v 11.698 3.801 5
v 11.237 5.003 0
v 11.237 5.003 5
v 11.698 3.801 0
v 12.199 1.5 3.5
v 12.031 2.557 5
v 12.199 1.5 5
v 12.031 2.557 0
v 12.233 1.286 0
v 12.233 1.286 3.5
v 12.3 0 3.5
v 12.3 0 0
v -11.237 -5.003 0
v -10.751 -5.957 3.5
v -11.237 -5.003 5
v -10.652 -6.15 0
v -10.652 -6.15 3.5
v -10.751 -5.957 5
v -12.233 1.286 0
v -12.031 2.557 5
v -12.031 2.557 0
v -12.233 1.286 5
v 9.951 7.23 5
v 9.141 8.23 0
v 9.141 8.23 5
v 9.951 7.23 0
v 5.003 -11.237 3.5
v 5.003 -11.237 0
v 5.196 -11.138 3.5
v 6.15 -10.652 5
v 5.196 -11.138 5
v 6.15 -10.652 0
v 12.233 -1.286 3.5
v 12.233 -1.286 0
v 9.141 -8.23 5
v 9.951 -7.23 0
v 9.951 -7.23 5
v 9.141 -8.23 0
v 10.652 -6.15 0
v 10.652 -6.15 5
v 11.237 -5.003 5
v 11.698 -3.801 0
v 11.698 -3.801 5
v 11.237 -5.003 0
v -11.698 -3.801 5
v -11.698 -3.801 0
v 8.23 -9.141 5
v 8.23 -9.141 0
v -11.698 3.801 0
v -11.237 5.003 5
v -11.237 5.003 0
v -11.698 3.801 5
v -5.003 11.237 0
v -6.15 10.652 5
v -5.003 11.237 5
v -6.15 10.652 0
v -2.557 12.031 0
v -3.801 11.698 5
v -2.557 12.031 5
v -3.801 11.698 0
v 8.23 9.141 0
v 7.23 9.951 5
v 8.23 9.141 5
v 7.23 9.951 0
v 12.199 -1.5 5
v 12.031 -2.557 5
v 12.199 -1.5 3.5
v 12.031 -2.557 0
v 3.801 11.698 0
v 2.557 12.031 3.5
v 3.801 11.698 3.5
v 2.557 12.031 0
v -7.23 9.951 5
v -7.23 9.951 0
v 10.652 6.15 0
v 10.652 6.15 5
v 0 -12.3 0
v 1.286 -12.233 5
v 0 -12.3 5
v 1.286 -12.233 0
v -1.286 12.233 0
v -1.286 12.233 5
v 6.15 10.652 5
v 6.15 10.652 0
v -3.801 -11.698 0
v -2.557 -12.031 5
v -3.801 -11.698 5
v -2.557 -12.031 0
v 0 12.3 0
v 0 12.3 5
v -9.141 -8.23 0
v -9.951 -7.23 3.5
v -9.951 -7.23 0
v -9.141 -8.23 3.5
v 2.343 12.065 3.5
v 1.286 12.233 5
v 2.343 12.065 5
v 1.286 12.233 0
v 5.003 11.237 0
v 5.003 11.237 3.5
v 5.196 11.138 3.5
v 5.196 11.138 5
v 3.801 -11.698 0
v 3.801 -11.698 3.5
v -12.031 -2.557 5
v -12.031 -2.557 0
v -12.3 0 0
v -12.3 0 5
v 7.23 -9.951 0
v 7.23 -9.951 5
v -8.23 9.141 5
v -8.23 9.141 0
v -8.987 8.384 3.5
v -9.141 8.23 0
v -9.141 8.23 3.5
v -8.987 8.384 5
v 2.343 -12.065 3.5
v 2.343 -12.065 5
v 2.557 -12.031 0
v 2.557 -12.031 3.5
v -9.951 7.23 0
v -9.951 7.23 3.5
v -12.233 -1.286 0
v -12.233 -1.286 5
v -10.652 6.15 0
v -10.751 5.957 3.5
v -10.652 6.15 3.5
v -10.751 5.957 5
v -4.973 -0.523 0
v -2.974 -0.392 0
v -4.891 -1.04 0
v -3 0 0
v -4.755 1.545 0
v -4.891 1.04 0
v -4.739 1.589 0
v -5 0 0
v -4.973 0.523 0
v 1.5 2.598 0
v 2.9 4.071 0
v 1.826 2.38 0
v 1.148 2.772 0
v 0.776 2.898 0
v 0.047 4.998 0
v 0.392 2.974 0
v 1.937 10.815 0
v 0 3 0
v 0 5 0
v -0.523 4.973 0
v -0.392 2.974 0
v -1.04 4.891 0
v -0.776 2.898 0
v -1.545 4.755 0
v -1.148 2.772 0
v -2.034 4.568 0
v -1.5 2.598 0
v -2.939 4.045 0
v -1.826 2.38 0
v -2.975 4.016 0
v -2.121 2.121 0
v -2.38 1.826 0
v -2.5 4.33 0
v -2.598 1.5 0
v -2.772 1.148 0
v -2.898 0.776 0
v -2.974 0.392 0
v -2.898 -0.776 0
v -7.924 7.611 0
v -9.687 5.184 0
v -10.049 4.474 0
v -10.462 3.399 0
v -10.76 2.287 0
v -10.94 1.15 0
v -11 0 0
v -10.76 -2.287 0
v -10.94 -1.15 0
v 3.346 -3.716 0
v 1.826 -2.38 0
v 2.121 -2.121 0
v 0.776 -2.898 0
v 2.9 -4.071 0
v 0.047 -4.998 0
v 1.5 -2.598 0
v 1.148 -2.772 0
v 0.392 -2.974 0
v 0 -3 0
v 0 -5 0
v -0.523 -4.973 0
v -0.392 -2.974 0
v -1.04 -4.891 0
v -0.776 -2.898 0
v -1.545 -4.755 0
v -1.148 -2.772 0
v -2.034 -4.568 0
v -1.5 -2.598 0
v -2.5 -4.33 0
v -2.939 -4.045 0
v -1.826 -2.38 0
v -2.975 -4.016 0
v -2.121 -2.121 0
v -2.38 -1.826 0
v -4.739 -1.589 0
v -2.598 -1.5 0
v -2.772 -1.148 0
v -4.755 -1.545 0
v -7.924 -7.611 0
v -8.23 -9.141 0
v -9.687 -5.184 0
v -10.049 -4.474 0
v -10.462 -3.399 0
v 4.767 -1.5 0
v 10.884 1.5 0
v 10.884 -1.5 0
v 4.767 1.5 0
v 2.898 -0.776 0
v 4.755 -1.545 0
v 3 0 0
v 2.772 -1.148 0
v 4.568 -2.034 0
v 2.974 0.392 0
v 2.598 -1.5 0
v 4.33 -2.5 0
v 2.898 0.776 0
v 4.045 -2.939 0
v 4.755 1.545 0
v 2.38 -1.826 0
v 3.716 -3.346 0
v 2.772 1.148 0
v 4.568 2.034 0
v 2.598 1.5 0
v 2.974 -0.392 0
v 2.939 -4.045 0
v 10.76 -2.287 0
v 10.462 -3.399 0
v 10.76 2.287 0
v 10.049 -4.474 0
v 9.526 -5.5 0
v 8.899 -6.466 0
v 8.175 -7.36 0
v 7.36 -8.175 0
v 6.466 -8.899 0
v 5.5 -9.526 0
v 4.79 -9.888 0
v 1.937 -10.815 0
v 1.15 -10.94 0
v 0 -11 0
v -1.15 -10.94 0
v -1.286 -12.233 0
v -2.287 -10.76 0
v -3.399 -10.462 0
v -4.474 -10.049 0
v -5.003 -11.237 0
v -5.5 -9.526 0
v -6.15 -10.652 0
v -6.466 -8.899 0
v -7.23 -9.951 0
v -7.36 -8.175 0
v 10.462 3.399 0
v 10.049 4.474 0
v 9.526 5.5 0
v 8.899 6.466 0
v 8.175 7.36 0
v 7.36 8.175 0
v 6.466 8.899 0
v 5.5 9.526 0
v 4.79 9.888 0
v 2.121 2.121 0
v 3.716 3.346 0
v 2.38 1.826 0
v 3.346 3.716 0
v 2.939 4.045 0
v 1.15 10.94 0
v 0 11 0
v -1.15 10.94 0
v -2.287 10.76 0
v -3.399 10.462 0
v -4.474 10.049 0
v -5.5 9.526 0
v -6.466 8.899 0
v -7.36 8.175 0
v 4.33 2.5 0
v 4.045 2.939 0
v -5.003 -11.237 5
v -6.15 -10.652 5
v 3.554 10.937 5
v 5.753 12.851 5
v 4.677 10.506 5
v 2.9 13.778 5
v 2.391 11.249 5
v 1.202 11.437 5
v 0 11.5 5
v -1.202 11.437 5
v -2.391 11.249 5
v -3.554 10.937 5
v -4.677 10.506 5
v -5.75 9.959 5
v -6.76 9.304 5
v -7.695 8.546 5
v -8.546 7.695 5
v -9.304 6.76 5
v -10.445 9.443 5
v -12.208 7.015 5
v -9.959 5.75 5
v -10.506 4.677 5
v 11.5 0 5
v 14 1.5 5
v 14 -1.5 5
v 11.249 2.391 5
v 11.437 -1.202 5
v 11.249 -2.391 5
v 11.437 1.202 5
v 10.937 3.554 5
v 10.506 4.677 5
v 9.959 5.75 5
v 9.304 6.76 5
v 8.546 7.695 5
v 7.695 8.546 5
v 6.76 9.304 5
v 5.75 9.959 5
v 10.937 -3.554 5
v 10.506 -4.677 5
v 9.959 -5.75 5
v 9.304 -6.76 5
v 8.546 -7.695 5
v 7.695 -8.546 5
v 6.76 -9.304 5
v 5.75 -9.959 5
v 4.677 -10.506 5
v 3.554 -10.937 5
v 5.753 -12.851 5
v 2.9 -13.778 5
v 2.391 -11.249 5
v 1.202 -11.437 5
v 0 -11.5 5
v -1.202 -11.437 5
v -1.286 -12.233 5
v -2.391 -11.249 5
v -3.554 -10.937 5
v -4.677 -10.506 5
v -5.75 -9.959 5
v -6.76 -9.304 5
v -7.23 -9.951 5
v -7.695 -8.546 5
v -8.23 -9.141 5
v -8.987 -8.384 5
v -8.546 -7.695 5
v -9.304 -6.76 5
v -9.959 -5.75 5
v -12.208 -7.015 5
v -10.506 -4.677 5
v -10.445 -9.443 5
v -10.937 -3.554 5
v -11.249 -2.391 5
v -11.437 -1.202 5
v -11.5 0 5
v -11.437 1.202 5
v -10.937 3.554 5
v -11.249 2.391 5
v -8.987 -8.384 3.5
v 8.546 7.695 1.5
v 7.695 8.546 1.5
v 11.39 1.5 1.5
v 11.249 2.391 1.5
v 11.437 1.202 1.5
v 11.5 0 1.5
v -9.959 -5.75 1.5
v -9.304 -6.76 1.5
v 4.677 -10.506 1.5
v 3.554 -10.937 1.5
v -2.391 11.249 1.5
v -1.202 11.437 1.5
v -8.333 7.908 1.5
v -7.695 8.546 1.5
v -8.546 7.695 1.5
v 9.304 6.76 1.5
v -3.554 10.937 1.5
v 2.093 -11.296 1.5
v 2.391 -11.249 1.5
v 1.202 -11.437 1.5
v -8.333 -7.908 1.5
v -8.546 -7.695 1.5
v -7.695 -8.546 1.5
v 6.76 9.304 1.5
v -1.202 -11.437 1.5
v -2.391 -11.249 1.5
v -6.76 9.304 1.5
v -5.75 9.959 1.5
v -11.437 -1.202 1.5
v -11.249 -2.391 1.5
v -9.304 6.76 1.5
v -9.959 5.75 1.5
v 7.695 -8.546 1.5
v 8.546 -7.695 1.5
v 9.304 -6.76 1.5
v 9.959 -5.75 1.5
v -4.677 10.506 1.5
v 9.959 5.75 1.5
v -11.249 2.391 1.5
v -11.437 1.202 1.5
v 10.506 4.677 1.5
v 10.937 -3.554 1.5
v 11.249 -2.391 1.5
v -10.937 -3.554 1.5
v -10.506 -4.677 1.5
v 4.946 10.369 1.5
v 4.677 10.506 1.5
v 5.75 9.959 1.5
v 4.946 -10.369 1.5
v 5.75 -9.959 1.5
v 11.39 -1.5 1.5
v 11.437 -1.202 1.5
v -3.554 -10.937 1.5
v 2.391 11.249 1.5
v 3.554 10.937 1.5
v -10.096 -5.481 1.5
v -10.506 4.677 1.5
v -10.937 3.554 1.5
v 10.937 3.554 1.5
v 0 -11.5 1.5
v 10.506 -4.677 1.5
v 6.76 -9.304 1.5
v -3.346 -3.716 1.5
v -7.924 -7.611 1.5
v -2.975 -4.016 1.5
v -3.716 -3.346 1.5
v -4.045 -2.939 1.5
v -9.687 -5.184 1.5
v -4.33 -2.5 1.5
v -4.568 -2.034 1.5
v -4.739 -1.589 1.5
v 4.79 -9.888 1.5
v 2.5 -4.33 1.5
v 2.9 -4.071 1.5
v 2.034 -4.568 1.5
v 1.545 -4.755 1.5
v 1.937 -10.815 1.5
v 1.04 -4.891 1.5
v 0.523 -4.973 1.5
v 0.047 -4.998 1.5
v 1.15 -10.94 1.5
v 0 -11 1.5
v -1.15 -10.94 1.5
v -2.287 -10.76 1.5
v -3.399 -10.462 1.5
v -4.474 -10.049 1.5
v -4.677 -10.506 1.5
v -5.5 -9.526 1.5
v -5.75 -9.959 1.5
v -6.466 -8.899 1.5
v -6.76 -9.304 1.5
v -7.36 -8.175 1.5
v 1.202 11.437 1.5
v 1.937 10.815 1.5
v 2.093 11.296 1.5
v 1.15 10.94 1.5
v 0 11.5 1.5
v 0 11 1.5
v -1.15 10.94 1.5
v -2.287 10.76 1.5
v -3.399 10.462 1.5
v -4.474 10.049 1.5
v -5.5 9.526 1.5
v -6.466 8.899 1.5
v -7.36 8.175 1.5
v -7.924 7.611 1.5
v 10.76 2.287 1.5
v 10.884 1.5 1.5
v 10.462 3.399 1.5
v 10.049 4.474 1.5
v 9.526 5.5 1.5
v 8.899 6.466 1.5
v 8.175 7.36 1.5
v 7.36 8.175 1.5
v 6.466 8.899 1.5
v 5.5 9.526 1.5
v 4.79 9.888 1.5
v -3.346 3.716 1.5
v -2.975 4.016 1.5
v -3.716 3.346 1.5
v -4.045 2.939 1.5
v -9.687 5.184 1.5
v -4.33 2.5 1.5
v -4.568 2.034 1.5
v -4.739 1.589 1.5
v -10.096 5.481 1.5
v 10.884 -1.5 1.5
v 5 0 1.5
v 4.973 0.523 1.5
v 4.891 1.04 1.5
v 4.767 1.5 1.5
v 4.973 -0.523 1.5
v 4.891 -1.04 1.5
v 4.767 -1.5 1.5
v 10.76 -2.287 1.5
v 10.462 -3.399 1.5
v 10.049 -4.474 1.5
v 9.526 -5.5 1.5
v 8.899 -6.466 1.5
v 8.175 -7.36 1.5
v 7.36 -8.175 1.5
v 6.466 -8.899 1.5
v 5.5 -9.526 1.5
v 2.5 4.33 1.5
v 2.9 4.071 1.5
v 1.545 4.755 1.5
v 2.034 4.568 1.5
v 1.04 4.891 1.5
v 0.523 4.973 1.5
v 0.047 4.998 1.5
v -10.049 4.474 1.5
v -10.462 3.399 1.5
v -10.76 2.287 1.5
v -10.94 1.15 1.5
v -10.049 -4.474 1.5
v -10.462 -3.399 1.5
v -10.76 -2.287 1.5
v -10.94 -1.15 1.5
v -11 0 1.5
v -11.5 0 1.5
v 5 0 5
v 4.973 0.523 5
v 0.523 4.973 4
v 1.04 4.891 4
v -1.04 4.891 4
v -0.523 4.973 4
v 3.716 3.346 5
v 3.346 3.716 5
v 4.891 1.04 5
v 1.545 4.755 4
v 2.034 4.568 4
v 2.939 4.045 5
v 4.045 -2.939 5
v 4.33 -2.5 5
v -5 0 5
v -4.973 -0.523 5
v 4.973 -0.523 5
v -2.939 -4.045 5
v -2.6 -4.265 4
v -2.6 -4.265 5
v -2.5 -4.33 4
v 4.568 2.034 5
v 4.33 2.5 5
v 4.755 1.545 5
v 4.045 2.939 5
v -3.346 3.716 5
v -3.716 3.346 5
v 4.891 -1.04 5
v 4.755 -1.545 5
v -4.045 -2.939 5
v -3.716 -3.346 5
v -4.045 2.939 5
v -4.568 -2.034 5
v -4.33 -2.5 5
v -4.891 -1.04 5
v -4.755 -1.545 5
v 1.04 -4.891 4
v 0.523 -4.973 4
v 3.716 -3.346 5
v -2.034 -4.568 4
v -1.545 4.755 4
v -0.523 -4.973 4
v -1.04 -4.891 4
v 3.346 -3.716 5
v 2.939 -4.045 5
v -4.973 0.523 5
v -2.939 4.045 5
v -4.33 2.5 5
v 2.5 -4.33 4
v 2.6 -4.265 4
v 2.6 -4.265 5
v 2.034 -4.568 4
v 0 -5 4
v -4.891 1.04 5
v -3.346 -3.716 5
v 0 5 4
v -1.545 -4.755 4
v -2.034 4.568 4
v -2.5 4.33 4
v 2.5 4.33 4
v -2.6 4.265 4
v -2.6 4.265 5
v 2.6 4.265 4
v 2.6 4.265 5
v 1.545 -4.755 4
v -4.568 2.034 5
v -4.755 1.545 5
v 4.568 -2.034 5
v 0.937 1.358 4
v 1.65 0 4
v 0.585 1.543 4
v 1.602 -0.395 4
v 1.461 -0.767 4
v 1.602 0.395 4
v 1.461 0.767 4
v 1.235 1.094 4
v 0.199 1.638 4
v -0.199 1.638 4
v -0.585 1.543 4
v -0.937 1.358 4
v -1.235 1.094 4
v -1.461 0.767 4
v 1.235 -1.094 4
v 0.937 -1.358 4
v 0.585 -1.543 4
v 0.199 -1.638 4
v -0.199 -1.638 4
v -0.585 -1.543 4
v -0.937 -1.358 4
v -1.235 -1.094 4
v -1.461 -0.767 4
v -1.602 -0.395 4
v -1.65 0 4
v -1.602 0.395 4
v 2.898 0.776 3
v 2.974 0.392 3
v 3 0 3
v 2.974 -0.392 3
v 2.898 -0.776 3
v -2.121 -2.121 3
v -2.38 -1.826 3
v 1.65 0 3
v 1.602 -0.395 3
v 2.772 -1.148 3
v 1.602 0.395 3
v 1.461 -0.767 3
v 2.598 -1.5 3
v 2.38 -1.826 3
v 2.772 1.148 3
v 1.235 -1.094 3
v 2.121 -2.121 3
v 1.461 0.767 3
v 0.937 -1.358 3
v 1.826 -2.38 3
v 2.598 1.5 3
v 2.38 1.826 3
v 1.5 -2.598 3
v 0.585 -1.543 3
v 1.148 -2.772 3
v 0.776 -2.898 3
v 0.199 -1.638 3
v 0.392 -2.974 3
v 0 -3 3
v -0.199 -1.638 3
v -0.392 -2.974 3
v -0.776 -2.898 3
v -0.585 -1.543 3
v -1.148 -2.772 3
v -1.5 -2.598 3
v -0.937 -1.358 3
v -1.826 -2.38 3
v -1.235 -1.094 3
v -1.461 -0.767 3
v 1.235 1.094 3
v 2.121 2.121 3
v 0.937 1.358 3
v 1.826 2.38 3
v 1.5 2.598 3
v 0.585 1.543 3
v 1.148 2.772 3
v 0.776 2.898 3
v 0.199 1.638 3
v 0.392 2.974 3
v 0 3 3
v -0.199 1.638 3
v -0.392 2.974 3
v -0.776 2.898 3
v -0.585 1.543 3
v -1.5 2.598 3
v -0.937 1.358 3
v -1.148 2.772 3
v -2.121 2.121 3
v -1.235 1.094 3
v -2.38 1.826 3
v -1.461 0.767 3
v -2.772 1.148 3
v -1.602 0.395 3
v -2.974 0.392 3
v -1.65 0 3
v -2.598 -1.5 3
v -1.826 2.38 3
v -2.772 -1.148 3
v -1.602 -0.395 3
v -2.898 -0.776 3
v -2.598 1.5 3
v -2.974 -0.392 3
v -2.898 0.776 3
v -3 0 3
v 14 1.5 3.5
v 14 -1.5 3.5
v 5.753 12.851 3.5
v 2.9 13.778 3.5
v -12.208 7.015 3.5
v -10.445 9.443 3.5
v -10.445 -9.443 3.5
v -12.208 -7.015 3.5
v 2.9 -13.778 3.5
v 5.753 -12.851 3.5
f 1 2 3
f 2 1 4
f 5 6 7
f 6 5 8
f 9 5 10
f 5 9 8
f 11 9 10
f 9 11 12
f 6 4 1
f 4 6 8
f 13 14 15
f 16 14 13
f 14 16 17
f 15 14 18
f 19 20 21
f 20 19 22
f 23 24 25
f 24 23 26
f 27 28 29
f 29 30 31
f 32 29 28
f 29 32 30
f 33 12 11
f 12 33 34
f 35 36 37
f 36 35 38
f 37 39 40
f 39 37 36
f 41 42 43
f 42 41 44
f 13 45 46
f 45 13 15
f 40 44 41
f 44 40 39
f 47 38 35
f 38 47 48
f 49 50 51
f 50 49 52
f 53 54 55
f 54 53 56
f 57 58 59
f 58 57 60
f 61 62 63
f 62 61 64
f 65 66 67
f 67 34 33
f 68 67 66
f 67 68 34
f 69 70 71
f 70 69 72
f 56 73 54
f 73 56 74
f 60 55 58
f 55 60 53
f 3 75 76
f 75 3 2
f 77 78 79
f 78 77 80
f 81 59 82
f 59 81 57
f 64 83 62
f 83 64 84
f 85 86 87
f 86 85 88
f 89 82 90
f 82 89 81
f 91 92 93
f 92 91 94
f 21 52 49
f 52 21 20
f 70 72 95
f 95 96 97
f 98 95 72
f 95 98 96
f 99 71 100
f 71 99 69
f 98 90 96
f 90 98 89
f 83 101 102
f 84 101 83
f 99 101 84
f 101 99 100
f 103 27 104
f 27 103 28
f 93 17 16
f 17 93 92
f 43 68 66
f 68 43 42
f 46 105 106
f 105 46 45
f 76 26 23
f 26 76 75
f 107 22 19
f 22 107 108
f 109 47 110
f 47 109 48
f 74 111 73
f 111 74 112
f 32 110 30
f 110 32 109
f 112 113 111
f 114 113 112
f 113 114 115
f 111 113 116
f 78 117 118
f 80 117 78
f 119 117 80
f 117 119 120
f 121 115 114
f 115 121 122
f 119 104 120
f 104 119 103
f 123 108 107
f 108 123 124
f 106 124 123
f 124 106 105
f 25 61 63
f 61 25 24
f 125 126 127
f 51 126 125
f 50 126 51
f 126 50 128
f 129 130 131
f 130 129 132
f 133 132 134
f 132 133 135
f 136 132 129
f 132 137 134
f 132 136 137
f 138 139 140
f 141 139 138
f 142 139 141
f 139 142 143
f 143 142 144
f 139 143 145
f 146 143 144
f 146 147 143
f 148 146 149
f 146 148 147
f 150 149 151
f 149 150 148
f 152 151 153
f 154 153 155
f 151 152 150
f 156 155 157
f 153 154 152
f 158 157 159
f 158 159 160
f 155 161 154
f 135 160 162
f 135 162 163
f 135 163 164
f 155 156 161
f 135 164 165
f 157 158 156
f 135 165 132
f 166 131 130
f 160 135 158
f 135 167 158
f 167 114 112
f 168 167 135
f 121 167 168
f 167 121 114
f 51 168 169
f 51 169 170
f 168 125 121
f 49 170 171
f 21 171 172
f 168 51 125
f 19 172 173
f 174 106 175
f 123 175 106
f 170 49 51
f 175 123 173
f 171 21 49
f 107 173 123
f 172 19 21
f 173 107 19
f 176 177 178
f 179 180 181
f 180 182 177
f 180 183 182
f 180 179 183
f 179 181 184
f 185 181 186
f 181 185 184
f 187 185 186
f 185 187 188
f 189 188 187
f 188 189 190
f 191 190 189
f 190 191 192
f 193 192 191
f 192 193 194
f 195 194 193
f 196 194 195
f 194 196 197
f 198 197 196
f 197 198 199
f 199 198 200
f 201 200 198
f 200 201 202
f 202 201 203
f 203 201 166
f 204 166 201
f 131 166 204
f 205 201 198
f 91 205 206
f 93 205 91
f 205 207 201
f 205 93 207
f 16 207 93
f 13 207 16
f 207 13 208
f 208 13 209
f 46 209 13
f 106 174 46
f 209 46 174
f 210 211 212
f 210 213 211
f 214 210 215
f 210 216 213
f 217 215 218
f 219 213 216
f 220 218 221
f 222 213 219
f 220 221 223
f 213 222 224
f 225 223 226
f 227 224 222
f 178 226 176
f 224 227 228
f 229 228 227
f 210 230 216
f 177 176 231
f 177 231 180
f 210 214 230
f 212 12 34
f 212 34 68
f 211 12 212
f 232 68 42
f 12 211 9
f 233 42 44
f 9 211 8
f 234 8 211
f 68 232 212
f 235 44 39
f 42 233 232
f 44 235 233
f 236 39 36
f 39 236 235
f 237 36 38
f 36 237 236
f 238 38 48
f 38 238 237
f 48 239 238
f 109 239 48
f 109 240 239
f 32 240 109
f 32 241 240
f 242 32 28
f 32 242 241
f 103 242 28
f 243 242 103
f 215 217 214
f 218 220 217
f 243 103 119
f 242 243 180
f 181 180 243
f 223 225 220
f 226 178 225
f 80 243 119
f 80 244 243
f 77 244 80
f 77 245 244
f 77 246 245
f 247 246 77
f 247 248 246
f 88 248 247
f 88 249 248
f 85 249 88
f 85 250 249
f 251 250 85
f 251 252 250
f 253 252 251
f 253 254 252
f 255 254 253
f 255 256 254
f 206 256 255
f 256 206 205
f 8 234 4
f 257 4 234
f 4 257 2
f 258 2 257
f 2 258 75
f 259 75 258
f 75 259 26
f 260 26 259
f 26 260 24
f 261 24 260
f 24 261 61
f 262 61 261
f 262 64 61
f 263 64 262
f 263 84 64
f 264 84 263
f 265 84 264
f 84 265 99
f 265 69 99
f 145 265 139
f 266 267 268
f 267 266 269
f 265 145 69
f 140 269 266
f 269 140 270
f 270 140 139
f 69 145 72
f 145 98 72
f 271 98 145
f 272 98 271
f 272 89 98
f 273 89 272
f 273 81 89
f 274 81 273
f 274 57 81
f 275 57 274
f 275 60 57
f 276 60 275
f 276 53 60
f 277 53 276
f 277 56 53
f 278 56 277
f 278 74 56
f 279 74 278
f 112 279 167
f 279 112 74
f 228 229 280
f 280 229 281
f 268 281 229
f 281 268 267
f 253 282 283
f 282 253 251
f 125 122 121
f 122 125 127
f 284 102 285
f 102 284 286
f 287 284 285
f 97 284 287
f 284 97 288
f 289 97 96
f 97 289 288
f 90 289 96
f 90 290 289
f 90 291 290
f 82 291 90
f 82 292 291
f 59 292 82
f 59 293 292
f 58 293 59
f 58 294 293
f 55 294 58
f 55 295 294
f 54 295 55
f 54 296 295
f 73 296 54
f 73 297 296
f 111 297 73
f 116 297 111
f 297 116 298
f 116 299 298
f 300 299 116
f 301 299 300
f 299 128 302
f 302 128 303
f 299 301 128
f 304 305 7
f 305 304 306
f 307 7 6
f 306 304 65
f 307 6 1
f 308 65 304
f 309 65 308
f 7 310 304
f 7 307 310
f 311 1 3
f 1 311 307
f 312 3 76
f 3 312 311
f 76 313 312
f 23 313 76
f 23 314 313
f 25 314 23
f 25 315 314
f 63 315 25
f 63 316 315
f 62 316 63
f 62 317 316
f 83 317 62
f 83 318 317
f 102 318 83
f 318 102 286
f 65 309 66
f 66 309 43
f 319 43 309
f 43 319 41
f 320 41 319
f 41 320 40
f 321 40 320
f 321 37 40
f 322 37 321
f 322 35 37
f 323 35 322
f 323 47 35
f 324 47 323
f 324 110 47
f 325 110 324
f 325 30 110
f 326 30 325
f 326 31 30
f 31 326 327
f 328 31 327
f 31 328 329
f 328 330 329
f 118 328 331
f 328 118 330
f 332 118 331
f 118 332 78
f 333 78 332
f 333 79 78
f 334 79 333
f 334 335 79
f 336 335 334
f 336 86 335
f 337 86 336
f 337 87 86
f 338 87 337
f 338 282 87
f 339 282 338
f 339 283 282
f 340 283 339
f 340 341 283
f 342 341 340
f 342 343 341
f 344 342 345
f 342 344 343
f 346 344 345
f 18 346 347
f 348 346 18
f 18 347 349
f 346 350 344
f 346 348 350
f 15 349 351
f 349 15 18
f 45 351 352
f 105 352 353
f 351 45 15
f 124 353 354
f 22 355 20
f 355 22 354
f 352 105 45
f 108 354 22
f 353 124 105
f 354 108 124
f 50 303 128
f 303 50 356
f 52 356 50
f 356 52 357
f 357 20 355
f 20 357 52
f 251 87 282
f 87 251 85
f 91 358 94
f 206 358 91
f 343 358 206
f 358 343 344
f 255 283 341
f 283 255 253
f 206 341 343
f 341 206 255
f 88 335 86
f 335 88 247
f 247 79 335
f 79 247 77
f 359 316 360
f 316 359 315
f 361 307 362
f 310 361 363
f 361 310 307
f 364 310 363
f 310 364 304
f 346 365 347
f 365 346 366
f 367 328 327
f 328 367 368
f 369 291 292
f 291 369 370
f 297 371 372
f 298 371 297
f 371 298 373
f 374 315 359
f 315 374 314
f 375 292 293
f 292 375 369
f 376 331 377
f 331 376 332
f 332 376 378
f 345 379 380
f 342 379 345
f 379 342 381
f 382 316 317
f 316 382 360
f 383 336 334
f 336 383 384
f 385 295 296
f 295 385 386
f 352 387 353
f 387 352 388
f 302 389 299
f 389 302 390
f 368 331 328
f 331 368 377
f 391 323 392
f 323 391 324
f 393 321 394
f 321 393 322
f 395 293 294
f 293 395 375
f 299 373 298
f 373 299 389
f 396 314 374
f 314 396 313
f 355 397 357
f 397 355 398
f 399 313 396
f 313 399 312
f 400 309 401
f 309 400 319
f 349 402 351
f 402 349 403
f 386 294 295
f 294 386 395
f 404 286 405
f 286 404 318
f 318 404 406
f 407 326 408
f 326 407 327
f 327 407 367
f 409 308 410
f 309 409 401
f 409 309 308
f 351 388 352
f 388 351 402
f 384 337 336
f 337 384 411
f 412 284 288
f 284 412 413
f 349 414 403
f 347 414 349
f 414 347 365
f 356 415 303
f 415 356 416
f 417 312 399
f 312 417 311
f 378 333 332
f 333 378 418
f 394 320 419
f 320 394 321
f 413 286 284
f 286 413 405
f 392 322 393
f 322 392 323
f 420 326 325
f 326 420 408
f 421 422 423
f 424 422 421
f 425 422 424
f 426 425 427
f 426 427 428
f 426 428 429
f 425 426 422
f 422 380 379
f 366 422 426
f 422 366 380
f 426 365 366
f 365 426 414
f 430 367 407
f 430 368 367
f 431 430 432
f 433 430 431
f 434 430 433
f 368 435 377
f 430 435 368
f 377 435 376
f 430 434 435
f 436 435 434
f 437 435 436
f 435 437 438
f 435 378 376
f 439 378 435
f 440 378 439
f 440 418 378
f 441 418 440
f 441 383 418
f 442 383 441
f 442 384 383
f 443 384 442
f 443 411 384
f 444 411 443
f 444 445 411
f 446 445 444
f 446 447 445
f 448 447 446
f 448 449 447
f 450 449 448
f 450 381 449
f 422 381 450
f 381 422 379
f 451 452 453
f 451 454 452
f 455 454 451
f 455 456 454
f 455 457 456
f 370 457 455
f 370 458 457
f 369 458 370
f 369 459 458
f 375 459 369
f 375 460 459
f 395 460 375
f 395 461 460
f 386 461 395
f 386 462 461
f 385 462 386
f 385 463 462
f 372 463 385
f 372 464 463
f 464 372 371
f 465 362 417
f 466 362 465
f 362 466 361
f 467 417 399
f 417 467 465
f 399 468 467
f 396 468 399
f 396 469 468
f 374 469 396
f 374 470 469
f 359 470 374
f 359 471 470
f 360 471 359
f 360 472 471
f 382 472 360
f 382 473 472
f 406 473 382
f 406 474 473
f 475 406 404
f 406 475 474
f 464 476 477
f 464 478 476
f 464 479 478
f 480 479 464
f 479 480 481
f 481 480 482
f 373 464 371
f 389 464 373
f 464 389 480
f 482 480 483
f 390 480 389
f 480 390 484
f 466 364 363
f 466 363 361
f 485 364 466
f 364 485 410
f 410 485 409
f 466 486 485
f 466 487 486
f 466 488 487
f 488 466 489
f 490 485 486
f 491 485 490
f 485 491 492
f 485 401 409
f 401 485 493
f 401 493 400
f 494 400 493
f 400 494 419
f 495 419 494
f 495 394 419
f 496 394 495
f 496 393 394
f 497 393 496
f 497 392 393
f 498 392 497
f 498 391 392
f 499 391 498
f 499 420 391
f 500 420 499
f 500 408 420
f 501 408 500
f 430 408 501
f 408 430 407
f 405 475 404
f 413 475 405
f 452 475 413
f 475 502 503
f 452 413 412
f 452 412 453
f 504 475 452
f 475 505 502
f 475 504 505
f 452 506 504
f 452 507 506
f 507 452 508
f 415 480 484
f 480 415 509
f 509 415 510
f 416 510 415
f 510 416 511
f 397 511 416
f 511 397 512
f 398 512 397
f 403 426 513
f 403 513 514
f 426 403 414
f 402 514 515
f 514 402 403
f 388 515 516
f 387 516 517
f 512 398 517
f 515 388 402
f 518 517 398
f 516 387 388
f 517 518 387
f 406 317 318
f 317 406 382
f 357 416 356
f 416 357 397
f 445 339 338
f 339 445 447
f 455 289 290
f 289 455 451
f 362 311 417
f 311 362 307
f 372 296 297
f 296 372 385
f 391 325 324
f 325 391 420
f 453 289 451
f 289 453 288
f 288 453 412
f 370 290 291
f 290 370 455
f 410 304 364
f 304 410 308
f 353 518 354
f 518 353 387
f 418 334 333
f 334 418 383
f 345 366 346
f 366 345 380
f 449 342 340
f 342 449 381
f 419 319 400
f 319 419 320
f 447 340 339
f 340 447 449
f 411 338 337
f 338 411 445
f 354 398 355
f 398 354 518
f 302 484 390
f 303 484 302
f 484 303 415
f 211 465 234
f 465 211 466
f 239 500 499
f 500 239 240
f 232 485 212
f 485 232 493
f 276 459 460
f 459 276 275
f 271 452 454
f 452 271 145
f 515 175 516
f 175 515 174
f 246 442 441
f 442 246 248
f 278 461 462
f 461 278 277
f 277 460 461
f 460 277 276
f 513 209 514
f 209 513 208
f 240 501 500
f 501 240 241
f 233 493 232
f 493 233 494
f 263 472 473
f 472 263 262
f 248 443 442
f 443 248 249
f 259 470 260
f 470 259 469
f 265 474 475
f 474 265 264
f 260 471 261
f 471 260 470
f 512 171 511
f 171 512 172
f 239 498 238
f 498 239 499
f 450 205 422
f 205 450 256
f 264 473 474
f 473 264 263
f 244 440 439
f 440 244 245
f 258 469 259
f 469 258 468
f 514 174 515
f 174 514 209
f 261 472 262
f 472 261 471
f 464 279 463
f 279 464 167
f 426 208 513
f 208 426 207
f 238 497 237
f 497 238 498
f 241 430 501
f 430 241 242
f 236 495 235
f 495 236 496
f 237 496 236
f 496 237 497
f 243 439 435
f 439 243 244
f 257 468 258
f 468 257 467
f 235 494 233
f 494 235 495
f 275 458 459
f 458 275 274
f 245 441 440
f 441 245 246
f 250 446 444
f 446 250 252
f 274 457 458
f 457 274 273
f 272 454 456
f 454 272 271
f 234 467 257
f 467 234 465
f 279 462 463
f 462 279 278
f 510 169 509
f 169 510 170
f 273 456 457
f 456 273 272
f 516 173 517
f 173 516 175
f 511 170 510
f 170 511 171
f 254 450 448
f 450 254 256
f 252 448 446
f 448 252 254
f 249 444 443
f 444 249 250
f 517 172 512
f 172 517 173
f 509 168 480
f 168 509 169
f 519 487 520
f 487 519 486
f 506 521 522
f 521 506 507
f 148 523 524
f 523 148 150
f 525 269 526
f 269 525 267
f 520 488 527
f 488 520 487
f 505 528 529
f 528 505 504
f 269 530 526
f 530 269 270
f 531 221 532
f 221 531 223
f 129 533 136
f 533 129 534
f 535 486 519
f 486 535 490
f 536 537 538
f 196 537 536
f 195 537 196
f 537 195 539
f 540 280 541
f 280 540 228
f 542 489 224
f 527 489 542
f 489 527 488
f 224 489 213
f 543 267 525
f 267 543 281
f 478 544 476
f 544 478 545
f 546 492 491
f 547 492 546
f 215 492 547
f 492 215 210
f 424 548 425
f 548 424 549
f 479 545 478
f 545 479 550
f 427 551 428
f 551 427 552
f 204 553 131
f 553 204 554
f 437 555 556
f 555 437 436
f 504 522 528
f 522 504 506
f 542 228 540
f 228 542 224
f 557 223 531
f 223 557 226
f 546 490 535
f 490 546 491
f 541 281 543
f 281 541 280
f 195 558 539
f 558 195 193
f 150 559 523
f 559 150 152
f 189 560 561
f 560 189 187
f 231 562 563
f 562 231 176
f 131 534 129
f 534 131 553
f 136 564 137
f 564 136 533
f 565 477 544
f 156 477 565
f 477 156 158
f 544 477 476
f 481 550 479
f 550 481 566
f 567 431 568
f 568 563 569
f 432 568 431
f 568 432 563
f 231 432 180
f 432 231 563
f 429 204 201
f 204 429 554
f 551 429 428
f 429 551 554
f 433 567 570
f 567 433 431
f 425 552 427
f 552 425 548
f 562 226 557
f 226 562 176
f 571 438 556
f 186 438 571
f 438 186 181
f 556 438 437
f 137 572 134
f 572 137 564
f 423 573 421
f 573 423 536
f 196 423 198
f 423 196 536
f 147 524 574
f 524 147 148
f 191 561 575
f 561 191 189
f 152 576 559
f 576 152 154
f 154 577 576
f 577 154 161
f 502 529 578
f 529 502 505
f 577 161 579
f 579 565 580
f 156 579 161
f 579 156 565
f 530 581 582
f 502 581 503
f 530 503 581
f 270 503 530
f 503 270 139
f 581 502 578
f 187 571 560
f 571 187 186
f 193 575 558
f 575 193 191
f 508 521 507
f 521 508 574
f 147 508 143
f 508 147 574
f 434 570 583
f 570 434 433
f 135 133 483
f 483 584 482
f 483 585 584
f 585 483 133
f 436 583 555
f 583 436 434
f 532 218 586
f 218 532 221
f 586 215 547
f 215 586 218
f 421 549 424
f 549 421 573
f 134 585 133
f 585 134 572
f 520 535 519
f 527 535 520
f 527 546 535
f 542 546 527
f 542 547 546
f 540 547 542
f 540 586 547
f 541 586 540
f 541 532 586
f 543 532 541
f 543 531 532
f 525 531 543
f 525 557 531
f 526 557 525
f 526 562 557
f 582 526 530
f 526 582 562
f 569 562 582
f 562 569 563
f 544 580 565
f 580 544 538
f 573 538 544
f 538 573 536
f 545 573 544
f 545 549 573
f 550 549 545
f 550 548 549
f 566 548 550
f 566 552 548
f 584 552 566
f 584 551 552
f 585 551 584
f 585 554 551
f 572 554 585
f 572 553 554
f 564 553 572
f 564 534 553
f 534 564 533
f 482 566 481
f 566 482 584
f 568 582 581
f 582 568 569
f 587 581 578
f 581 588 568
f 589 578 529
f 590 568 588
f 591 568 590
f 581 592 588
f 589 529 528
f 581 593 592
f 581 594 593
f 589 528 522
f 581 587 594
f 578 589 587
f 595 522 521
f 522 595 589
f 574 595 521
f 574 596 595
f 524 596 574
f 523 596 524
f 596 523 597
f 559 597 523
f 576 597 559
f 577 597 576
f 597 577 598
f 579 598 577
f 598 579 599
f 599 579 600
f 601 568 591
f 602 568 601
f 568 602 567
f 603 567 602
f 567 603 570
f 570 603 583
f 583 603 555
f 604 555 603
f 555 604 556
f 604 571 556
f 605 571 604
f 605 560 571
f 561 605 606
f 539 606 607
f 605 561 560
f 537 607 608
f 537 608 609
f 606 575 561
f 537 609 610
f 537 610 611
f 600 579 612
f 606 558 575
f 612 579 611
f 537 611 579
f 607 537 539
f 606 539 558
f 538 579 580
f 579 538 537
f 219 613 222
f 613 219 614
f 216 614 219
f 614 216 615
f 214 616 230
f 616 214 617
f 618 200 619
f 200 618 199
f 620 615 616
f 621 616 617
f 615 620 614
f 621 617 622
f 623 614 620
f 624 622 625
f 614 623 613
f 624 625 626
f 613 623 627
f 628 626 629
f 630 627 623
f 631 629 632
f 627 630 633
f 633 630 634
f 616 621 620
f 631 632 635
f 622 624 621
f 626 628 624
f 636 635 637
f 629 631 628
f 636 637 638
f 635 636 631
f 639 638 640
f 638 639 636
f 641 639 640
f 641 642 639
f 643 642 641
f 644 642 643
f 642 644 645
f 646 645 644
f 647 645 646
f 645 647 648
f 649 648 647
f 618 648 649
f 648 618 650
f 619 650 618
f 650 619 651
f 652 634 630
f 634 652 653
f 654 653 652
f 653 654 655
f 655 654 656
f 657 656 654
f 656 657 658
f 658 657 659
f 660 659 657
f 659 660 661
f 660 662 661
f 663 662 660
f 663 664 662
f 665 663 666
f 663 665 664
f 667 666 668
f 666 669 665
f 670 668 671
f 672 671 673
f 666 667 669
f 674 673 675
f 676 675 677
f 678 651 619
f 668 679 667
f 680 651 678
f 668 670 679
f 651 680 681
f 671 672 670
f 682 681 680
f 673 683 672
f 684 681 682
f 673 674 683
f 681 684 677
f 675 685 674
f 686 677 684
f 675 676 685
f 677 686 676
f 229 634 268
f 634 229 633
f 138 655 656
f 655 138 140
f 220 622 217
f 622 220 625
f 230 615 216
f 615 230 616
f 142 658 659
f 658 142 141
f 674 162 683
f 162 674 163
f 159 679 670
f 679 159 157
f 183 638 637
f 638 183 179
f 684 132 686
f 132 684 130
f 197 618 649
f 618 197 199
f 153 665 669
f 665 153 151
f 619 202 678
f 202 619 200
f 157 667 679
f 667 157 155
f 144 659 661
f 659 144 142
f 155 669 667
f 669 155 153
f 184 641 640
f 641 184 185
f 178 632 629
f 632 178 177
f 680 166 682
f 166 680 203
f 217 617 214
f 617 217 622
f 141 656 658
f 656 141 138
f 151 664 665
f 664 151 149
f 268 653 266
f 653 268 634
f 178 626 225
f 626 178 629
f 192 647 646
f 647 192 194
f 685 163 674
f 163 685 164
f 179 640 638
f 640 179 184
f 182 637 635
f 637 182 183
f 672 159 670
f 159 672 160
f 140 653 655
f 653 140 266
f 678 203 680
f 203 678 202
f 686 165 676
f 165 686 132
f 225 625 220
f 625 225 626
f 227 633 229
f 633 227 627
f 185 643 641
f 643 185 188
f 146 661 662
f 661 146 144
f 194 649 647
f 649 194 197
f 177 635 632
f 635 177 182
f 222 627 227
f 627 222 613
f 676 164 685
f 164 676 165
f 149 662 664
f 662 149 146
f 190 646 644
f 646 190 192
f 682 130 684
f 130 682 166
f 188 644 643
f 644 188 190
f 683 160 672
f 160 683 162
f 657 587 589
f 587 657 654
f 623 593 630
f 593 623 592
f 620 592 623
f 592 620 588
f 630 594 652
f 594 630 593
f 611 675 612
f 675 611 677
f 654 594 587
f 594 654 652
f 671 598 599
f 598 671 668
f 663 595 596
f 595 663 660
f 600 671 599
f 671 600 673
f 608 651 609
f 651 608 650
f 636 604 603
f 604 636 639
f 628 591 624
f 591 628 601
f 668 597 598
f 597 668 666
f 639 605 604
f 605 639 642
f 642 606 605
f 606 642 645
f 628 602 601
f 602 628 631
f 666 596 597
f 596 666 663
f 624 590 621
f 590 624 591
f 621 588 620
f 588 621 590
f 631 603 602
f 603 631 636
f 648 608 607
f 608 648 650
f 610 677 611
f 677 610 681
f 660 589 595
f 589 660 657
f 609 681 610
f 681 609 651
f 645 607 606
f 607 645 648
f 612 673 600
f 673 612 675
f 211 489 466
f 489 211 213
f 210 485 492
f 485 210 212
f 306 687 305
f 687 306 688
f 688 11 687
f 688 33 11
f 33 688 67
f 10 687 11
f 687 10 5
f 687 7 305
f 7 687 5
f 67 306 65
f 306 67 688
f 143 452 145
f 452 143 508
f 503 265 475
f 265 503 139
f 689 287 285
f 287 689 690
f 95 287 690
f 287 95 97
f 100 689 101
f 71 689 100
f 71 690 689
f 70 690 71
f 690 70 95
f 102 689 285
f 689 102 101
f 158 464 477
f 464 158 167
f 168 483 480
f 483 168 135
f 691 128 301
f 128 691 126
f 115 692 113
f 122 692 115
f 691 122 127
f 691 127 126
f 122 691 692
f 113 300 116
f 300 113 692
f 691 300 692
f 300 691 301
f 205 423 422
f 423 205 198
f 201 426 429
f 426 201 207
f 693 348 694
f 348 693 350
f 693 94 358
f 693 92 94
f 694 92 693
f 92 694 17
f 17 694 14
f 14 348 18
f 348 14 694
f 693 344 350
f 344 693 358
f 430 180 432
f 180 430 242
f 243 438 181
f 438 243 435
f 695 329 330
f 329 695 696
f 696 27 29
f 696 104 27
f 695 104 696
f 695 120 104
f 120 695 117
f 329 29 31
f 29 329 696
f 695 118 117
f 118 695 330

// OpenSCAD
$fa = 6;
$fs = 0.4;

union() {
    difference(){
        union () {
            // toleranced so that it slides
            cylinder (d=24.6, h=5);
            //cylinder (d=26.2, h=4, $fn=5);
        }
        translate([0,0,1.5]) cylinder (d=23, h=5);
        cylinder (d=22, h=3);
    }
    
    difference(){
        cylinder (d=10, h=5);
        translate([0,0,5]) cube ([5.2,10,2] , center=true);
        cylinder (d=6, h=3);
        cylinder (d=3.3, h=5);
    }
    
    // fins
        for (i = [0:4]) {
            // inner
            rotate([0,0, (i * 72)]) translate([4.5,-1.5,0]) cube([7,3,1.5]);
            // outer
            rotate([0,0, (i * 72)]) translate([12,-1.5, 3.5]) cube([2,3,1.5]);
        }
    
}
